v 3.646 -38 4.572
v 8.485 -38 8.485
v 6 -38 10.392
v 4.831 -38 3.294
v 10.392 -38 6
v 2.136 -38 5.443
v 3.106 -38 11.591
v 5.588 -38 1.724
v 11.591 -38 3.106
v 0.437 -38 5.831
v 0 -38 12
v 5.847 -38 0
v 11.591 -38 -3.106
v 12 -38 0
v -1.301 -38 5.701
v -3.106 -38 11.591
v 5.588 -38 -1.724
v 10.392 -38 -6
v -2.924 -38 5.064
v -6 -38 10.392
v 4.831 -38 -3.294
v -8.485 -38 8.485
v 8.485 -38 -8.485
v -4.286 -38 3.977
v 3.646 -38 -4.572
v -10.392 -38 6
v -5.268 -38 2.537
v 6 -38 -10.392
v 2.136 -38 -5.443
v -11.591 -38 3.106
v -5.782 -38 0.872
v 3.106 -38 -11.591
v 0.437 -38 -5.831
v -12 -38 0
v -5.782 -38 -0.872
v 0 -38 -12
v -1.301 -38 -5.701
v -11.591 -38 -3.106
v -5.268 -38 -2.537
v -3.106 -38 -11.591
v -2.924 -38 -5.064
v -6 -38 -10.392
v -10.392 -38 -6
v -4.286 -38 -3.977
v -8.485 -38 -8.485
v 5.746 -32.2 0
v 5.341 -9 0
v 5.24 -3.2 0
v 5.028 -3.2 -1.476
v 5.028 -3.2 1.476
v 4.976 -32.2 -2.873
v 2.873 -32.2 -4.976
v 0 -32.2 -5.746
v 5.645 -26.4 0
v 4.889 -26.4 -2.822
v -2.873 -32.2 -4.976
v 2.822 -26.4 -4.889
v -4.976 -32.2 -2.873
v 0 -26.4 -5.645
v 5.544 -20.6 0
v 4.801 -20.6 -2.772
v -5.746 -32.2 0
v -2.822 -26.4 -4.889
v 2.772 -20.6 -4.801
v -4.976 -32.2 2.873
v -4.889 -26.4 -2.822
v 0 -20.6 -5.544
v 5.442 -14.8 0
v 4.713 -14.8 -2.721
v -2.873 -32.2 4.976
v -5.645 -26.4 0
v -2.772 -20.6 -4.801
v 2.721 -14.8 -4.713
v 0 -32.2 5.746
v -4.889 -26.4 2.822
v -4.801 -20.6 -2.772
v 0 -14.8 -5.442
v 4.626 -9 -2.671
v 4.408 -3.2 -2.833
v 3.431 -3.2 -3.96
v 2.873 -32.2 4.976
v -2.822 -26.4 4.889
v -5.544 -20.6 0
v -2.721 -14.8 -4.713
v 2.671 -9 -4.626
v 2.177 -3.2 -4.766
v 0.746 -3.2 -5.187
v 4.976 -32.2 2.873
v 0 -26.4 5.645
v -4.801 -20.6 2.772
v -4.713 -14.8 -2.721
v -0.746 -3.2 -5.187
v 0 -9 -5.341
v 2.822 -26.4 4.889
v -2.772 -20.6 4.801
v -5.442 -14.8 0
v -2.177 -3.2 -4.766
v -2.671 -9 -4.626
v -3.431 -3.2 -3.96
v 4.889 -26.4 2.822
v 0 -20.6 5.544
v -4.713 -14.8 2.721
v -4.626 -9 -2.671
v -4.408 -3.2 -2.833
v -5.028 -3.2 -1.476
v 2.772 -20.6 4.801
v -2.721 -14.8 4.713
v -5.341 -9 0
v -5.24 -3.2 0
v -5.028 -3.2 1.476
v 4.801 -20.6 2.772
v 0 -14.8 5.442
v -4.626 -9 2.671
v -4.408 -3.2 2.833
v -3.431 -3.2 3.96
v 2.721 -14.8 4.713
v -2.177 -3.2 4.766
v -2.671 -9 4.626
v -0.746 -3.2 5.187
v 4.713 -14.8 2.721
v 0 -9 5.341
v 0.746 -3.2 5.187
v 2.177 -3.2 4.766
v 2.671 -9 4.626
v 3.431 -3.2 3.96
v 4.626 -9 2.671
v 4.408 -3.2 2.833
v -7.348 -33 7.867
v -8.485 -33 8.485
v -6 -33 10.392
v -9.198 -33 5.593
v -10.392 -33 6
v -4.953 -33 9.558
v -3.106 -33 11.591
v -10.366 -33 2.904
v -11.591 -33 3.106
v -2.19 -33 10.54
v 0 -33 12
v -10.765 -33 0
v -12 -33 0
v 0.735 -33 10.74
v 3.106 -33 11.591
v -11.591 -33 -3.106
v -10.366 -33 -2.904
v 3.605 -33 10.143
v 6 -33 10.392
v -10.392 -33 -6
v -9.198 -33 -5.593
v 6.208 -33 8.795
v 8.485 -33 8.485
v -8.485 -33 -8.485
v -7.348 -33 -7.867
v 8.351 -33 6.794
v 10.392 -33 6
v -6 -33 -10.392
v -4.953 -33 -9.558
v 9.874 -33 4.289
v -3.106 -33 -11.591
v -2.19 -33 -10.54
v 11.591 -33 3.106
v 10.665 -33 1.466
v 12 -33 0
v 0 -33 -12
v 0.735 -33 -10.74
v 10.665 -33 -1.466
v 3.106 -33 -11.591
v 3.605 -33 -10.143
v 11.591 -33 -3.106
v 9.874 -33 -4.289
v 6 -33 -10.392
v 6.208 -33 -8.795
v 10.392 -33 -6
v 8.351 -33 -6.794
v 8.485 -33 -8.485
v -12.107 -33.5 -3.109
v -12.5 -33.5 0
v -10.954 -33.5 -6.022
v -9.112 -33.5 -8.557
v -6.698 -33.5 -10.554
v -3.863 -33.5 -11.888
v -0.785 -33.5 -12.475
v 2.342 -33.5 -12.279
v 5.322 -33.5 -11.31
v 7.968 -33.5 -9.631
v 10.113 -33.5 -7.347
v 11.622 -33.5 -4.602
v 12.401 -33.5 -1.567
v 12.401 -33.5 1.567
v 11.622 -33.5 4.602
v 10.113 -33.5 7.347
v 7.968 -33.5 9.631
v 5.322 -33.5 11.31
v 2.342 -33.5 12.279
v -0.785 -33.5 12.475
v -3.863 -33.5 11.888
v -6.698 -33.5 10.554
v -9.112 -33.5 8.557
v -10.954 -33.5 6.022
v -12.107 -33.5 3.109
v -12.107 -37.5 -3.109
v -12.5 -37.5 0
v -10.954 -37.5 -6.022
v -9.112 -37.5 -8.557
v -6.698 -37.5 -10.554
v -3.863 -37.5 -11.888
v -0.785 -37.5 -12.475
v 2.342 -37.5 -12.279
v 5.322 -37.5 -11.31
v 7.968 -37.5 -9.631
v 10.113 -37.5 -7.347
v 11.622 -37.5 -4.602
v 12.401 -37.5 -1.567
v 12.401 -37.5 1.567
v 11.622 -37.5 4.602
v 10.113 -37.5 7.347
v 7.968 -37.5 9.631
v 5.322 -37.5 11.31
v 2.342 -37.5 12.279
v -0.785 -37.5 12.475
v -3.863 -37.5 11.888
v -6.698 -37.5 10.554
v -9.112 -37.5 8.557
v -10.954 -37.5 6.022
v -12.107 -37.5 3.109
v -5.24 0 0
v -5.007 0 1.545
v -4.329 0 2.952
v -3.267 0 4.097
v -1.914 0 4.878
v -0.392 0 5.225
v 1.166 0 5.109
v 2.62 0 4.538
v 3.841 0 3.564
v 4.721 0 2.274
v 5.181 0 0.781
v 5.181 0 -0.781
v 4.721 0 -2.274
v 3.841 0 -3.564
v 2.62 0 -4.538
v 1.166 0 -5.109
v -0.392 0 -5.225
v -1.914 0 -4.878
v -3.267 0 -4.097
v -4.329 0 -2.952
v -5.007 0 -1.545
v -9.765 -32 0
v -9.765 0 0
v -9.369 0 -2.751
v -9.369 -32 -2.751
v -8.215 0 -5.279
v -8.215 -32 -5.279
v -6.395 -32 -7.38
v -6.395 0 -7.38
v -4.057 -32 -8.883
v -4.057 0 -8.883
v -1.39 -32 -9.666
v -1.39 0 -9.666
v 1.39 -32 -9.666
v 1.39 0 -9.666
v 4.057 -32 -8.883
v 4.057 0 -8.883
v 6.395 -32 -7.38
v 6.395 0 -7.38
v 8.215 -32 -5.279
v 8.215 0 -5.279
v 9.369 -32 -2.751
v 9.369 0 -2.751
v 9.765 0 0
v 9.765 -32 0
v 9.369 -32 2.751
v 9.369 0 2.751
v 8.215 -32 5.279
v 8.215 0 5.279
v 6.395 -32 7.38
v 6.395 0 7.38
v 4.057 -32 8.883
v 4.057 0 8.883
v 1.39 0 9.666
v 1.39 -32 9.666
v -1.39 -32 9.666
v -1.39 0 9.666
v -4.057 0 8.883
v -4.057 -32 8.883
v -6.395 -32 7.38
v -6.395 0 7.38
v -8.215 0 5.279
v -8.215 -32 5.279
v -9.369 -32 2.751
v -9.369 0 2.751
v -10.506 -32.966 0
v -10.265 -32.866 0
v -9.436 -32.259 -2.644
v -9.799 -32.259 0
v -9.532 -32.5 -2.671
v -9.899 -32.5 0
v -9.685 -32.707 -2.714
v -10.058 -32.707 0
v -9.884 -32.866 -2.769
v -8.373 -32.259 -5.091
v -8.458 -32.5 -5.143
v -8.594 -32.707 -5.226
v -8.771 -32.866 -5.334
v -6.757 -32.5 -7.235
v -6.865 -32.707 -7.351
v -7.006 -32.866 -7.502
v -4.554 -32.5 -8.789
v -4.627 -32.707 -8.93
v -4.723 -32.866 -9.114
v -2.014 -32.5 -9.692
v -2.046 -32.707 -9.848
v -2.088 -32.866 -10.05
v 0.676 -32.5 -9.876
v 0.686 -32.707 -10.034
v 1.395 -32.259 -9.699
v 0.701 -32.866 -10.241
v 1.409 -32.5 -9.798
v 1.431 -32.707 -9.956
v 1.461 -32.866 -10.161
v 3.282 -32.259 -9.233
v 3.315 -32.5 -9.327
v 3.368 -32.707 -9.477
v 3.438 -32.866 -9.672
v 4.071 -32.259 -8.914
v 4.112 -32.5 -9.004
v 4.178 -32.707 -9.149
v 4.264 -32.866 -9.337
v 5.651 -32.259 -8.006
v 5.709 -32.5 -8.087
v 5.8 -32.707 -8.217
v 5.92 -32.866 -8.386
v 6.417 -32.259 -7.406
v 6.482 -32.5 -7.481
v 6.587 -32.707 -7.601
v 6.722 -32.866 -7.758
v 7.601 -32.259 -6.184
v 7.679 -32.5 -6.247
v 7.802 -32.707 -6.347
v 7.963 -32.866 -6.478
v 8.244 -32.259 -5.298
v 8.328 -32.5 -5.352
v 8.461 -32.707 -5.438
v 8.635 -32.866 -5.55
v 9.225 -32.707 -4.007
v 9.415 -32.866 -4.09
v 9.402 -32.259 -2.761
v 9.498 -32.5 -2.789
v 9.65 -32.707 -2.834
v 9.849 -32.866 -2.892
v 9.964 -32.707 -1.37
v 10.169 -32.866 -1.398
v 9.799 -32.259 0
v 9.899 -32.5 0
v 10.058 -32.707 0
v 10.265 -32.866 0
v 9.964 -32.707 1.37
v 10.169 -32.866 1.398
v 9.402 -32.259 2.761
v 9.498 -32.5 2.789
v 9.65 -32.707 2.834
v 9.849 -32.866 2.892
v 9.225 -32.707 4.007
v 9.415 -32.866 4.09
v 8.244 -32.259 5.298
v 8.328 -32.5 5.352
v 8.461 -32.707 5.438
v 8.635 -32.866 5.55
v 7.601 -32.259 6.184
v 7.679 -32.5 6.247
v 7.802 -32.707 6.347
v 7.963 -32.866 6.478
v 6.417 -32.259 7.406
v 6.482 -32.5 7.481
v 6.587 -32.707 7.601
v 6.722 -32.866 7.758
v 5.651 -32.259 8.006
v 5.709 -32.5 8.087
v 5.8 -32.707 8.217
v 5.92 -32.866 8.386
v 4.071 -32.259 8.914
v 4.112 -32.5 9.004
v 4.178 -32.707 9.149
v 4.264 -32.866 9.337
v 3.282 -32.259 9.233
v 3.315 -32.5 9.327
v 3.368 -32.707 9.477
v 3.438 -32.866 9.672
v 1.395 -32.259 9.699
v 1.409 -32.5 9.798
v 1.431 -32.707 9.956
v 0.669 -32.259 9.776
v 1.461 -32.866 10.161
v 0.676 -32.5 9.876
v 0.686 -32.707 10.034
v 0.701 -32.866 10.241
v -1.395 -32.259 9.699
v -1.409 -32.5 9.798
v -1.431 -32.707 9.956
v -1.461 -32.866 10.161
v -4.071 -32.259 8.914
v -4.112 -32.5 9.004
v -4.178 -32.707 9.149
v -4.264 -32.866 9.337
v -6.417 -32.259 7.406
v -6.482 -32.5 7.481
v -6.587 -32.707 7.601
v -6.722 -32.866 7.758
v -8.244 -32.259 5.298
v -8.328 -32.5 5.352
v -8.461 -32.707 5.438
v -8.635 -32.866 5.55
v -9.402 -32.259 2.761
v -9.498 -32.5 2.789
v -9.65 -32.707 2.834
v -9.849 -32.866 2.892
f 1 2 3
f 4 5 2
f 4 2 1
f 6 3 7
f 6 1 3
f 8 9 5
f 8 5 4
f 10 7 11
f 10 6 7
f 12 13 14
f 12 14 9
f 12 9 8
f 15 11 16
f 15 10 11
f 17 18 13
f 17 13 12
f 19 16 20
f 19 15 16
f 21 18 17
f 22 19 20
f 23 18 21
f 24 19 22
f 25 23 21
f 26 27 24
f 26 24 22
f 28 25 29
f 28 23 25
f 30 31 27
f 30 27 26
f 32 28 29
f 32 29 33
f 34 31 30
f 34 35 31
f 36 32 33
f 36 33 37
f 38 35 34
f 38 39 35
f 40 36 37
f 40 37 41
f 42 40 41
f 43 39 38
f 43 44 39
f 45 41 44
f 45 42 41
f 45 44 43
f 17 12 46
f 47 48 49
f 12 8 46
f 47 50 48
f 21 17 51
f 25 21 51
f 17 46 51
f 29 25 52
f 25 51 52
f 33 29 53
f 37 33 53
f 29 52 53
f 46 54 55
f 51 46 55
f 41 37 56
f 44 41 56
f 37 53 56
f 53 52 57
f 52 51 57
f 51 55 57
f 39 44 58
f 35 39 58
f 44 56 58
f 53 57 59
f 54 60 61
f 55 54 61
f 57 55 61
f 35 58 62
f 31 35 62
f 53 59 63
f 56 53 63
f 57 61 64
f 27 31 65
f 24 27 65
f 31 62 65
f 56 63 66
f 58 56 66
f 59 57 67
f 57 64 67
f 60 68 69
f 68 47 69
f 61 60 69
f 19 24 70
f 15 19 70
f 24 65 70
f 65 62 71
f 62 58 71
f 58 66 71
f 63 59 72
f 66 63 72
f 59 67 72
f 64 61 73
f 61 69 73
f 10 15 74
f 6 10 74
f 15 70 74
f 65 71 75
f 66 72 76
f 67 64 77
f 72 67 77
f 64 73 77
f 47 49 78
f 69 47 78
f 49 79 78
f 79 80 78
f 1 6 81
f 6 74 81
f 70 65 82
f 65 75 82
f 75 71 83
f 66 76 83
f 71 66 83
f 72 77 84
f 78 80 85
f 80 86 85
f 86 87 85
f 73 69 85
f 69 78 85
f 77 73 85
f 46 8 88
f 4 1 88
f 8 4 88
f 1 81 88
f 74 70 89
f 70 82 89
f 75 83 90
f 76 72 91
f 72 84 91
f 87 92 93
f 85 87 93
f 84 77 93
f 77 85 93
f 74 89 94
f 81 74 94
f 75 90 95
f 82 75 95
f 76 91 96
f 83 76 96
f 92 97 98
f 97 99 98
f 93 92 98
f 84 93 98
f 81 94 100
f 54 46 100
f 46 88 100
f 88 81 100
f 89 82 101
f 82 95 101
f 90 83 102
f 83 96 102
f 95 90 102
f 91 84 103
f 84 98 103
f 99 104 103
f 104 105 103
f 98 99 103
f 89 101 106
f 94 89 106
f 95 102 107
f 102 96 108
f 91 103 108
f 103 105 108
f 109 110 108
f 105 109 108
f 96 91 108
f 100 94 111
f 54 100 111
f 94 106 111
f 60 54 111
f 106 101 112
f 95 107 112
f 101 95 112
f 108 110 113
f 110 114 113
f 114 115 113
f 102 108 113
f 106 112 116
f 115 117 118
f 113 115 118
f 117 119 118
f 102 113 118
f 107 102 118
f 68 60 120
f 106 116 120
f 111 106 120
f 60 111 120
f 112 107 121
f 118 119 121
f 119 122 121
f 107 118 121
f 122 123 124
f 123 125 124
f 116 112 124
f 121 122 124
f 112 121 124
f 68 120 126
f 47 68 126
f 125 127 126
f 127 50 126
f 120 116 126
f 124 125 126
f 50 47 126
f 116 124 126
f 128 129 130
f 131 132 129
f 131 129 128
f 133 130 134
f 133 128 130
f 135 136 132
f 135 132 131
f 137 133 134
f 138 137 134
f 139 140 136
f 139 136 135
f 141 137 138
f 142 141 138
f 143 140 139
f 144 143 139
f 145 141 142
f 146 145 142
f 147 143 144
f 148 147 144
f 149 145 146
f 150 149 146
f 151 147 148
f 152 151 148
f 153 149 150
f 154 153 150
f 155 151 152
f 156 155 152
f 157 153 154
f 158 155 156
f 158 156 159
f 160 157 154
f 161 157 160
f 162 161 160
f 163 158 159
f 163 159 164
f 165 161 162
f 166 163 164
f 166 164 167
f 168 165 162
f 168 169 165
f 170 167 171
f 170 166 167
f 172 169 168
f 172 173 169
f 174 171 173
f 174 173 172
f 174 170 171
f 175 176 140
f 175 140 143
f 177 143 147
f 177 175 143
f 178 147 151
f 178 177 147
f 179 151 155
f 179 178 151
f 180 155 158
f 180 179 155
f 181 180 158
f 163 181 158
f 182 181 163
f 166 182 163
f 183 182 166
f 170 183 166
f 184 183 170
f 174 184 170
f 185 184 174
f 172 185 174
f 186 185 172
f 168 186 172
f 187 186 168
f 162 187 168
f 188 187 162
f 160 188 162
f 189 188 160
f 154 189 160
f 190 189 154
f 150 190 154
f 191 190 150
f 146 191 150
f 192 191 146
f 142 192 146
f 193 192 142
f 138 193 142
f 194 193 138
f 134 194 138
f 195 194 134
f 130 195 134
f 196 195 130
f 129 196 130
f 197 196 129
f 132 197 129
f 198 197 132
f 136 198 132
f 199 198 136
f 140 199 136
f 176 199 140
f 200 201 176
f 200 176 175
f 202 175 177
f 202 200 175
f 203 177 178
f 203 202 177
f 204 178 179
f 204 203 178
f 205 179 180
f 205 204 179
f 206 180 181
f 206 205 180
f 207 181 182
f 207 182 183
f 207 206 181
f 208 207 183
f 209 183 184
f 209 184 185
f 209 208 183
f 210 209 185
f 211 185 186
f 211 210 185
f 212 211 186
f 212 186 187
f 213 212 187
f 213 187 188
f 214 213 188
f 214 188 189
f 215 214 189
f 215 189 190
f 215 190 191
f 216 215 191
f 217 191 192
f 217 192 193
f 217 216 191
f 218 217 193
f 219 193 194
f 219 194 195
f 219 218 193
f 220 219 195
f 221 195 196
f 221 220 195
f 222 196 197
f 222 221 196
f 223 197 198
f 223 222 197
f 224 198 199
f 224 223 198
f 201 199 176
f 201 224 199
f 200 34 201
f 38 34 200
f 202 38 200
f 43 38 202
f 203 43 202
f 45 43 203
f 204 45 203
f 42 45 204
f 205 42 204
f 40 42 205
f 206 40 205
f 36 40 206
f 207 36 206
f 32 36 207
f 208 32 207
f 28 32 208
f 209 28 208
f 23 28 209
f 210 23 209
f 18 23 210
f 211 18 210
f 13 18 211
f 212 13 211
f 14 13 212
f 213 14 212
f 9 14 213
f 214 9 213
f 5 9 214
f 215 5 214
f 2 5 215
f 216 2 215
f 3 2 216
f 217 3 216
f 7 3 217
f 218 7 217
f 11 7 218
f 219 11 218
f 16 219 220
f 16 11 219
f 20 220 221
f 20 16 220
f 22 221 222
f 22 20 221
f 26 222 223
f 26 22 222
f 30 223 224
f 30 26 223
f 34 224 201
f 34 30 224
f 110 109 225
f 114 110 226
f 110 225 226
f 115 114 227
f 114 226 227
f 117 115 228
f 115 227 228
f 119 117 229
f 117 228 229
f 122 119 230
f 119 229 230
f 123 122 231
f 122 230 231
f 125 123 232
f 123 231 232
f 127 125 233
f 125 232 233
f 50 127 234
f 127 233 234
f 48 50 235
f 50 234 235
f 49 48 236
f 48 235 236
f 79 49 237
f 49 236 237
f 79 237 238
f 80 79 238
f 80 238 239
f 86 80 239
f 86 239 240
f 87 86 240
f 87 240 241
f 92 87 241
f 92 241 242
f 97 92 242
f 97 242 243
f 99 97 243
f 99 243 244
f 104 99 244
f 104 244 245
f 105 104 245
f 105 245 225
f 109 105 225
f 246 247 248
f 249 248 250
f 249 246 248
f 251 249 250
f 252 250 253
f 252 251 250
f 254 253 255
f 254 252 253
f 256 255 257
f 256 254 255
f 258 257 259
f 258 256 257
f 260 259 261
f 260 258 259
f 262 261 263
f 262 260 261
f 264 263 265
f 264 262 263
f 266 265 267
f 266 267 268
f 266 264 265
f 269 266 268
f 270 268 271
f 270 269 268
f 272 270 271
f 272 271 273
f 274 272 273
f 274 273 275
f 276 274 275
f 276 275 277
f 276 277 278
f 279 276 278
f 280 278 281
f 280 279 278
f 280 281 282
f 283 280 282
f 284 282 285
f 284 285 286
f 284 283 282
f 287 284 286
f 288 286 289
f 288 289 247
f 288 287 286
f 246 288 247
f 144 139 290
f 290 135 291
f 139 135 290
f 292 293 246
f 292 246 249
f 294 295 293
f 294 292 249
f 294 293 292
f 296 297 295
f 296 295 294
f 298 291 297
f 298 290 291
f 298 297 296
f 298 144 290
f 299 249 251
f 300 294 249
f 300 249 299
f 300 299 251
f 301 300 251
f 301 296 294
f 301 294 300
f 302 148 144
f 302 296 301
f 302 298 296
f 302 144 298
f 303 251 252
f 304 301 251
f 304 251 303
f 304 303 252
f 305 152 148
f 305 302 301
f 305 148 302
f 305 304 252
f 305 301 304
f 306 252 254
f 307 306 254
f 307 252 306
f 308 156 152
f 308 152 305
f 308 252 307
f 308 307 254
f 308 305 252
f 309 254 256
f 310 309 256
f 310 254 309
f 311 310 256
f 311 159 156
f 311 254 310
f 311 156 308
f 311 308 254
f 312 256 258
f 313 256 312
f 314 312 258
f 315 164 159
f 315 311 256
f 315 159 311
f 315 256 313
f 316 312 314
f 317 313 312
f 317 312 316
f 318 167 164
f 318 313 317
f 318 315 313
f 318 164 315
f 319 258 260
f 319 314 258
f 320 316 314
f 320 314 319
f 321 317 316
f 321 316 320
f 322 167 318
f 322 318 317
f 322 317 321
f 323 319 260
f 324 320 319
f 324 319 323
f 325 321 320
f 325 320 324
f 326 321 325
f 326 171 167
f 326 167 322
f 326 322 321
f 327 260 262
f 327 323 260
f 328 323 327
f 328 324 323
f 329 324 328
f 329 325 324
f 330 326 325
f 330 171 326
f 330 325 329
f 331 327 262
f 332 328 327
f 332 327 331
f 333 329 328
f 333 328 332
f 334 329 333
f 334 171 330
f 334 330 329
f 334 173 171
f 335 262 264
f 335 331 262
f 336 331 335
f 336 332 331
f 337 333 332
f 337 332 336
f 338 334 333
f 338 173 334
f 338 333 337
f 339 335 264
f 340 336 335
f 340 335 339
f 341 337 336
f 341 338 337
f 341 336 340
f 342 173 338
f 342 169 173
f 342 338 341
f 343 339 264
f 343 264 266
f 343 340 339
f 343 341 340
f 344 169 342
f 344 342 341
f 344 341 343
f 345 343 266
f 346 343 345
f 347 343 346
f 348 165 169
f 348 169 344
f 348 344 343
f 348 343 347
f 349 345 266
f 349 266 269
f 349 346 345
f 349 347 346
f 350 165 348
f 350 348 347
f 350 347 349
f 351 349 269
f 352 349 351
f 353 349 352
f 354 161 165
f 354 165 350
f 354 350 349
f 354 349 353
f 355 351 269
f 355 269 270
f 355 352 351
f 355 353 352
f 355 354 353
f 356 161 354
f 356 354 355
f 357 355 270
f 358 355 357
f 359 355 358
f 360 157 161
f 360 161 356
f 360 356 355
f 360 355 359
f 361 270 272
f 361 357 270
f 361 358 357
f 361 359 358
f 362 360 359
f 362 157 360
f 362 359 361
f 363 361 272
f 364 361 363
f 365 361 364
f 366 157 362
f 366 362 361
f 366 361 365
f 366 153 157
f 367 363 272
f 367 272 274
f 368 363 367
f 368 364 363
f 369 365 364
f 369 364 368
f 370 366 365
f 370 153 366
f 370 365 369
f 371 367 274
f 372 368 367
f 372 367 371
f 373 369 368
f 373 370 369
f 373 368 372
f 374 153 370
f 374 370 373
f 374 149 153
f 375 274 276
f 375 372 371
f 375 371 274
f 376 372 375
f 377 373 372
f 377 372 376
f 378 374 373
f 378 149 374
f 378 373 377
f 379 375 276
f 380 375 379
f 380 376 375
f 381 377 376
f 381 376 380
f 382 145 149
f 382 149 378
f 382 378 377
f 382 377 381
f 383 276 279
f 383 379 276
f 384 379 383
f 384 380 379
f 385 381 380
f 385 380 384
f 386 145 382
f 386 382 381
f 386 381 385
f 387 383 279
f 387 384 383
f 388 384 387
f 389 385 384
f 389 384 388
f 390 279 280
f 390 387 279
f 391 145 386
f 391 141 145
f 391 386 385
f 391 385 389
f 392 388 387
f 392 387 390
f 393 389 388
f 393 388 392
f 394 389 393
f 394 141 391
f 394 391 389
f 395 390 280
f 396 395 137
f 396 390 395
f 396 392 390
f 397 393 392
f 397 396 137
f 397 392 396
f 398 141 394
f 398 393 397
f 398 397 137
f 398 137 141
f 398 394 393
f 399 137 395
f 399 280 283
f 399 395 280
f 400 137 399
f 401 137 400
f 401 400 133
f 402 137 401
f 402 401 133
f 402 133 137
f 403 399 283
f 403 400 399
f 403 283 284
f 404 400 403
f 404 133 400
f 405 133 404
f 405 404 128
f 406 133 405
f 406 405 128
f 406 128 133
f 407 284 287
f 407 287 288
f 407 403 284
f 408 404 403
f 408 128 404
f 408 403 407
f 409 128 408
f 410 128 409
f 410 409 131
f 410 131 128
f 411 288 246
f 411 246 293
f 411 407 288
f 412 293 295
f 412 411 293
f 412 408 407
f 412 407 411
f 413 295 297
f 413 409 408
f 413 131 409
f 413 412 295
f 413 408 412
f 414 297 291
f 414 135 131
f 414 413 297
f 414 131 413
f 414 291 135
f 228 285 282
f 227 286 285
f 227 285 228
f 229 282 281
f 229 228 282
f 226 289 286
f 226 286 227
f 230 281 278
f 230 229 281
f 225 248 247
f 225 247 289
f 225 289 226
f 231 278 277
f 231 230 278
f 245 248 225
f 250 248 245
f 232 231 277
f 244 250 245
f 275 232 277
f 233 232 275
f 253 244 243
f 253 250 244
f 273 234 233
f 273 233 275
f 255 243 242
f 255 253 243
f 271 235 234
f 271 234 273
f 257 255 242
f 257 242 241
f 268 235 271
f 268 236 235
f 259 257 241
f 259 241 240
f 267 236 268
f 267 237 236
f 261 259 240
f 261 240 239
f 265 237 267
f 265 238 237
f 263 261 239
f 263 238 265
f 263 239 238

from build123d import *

# Parameters (mm, degrees)
CUT_EXTRUDE1_REACH = 43.911
SKETCH2_R          = 5.24
FILLET2_R          = 1
CHAMFER1_SIZE      = 0.5


# Read off the part's stored shape, not the designer's step: Draft1
with BuildPart() as part:
    # Sketch1 → Revolve1 (revolve)
    with BuildSketch(Plane.XY, mode=Mode.PRIVATE) as revolve1_sk:
        Polygon((0, 0), (9.765, 0), (9.765, -33), (12.5, -33), (12.5, -38), (0, -38), align=None)
    revolve(revolve1_sk.sketch.rotate(Axis((0, 5, 0), (0, -1, 0)), 180), axis=Axis((0, 5, 0), (0, -1, 0)))

    # Sketch2 → Cut-Extrude1 (cut, up to next)
    with BuildSketch(Plane(origin=(0, 0, 0), x_dir=(1, 0, 0), z_dir=(0, 1, 0)), mode=Mode.PRIVATE) as cut_extrude1_sk1:
        with Locations(Location((0, 0, 0), (0, 0, 180))):
            Circle(SKETCH2_R)
    cut_extrude1_tool1 = extrude(cut_extrude1_sk1.sketch, amount=-CUT_EXTRUDE1_REACH, mode=Mode.PRIVATE) & part.part
    add(cut_extrude1_tool1.solids().sort_by_distance((0, 0, 0))[0], mode=Mode.SUBTRACT)

    # Draft1 outline → Draft1 (revolve, cut)
    with BuildSketch(Plane.XY):
        Polygon((5.84743626, -38), (5.24, -3.2), (5.24, -38), align=None)
    revolve(axis=Axis((0, 0, 0), (0, 1, 0)), mode=Mode.SUBTRACT)

    # Fillet2
    fillet2_edges = [part.edges().sort_by_distance(p)[0] for p in [
        (9.765, -33, 0),
    ]]
    fillet(fillet2_edges, radius=FILLET2_R)

    # Chamfer1
    chamfer1_edges = [part.edges().sort_by_distance(p)[0] for p in [
        (12.5, -38, 0),
        (12.5, -33, 0),
    ]]
    chamfer(chamfer1_edges, length=CHAMFER1_SIZE)


solid = part.part
